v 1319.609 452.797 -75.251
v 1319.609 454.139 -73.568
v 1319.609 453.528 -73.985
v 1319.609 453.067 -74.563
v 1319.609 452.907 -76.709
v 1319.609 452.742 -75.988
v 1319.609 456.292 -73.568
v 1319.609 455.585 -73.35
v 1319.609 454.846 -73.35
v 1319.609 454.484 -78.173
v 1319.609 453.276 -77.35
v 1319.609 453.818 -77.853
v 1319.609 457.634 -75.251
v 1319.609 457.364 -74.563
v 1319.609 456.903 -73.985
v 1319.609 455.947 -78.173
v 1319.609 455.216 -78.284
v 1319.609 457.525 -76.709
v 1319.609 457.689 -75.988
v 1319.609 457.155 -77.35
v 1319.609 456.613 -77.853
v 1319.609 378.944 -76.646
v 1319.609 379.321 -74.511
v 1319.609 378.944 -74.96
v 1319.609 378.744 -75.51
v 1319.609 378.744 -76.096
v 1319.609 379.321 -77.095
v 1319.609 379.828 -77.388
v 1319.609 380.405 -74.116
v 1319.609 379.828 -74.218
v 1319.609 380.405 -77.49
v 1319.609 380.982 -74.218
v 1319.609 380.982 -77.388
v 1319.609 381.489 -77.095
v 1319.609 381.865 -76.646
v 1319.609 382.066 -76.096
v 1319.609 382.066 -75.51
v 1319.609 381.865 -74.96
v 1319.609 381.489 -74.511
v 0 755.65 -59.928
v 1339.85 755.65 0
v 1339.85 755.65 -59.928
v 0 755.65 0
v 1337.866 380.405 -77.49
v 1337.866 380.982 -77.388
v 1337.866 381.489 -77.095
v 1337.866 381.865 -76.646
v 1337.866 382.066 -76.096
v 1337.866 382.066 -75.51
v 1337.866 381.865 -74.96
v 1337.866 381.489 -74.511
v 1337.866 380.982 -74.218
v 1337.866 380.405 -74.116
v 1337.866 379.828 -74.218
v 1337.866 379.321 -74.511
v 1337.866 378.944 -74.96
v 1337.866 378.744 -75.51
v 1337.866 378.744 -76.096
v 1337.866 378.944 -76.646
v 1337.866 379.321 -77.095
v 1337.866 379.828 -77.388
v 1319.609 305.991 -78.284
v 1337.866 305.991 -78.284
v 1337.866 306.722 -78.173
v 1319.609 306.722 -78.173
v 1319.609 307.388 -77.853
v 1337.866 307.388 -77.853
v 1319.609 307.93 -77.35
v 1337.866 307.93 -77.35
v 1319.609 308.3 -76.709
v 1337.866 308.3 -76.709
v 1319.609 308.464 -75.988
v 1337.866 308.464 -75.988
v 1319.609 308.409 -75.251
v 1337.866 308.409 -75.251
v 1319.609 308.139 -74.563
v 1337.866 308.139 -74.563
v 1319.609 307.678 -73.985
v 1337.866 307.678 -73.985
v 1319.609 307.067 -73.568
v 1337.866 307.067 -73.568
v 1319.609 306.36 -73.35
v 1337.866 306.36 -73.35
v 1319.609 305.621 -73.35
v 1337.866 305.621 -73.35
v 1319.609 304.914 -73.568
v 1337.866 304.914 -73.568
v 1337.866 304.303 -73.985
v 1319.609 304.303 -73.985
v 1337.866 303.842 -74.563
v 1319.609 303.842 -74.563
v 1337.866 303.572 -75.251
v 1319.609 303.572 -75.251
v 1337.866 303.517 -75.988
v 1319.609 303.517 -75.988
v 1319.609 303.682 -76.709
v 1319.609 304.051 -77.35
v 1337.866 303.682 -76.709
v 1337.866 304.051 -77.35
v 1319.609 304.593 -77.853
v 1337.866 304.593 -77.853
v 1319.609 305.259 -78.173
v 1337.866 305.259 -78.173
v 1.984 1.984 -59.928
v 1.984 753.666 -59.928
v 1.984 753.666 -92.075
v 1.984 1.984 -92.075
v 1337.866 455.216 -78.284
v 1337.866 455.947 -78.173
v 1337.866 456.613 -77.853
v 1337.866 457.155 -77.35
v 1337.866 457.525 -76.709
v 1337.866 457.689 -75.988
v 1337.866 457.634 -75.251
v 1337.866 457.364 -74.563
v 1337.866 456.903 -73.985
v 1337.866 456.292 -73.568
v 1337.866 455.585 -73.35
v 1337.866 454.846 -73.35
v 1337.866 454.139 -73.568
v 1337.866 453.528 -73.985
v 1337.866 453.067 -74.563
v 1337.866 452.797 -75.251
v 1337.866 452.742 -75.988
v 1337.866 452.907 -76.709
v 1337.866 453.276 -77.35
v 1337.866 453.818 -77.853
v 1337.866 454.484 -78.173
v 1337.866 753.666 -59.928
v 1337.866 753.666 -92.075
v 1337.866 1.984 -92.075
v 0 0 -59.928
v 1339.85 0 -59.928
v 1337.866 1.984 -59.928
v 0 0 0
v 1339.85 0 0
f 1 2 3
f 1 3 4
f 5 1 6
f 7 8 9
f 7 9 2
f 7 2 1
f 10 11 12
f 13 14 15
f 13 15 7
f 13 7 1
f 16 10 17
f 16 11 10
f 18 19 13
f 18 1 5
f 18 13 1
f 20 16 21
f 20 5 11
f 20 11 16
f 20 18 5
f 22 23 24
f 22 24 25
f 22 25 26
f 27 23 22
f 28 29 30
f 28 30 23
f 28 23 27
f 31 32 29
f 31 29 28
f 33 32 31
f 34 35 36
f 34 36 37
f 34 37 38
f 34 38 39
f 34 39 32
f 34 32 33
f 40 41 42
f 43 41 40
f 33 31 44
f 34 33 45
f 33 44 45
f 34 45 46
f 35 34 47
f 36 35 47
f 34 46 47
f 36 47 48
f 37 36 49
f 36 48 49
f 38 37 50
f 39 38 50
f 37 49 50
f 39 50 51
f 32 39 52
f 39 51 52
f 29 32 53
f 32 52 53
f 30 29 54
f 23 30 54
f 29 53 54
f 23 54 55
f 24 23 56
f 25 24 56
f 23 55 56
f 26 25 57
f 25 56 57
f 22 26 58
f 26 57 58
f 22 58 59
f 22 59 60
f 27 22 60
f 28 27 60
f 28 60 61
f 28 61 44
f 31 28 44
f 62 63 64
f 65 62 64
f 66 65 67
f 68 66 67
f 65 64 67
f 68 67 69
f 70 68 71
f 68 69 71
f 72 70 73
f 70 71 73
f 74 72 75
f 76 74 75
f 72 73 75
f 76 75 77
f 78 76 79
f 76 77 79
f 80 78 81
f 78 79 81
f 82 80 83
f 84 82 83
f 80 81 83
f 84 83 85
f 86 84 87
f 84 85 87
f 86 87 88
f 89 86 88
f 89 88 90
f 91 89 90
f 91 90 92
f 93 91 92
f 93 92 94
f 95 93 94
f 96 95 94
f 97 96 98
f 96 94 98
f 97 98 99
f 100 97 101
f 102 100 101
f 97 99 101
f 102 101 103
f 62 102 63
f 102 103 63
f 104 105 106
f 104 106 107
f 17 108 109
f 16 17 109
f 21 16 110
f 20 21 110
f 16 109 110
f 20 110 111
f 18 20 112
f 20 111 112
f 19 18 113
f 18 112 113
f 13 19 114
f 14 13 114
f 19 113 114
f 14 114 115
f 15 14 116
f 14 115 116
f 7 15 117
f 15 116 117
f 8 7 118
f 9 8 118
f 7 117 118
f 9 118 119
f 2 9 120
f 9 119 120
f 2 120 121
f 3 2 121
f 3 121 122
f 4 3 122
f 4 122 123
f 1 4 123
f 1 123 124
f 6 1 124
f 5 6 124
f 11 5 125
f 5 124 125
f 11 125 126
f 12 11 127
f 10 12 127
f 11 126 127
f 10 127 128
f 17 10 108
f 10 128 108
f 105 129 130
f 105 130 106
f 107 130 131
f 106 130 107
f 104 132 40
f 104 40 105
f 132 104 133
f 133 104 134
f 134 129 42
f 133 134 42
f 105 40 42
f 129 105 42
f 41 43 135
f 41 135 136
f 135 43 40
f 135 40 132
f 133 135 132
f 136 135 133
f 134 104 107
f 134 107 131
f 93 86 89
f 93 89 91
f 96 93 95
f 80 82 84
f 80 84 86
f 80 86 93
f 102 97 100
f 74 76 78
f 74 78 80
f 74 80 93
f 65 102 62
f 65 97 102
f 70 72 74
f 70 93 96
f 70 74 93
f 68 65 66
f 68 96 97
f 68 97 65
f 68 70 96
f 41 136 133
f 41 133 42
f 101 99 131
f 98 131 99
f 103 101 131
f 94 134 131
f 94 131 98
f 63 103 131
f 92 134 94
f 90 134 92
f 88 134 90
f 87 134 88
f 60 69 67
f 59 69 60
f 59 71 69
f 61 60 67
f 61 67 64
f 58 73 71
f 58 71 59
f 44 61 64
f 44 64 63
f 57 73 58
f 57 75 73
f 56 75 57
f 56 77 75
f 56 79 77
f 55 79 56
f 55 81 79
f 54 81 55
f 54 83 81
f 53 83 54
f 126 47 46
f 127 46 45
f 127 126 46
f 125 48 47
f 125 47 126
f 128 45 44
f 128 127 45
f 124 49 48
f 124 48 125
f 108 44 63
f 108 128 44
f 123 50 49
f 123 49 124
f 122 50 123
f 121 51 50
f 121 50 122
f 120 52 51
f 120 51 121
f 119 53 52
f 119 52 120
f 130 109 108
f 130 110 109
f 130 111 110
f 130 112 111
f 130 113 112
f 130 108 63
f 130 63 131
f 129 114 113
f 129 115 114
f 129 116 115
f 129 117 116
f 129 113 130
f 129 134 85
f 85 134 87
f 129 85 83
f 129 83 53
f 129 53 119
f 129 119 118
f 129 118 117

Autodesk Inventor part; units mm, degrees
ref_plane "YZ Plane" through (0, 0, 0) normal (1, 0, 0) x (0, 1, 0)
ref_plane "XZ Plane" through (0, 0, 0) normal (0, 1, 0) x (-1, 0, 0)
ref_plane "XY Plane" through (0, 0, 0) normal (0, 0, 1) x (1, 0, 0)
sketch "Sketch1" plane through (0, 0, 0) normal (0, 0, 1) x (1, 0, 0)
  line L0 (0, 0) -> (1339.85, 0)
  line L1 (1339.85, 0) -> (1339.85, 755.65)
  line L2 (1339.85, 755.65) -> (0, 755.65)
  line L3 (0, 755.65) -> (0, 0)
  dimension "tvWidth" = 1339.85
  dimension "tvHeight" = 755.65
  dimension "tvDiagonal" = 1538.2474
extrude "Extrusion1" add sketch "Sketch1" against normal blind 59.9281
sketch "Sketch2" plane through (0, 0, -59.9281) normal (0, 0, -1) x (-1, 0, 0)
  line L0 (-1339.85, 0) -> (-1339.85, 755.65) projected
  line L1 (0, 0) -> (-1339.85, 0) projected
  line L2 (0, 755.65) -> (0, 0) projected
  line L3 (-1339.85, 755.65) -> (0, 755.65) projected
  line L4 (-1337.8656, 753.6656) -> (-1.9844, 753.6656)
  line L5 (-1.9844, 753.6656) -> (-1.9844, 1.9844)
  line L6 (-1.9844, 1.9844) -> (-1337.8656, 1.9844)
  line L7 (-1337.8656, 1.9844) -> (-1337.8656, 753.6656)
  dimension "backBezelToFrontBezelSizeDifference" = 1.9844
  dimension "d7" = 1.9844
  dimension "d8" = 1.9844
  dimension "d9" = 1.9844
extrude "Extrusion2" add sketch "Sketch2" along normal blind 32.1469 contours L4 L5 L6 L7
sketch "Sketch3" plane through (1337.8656, 1.9844, -59.9281) normal (1, 0, 0) x (0, 0, -1)
  line L0 (32.1469, 0) -> (32.1469, 751.6812) projected
  line L1 (0, 751.6812) -> (32.1469, 751.6812) projected
  circle A0 centre (15.875, 453.2312) radius 2.4805
  circle A1 centre (15.875, 304.0062) radius 2.4805
  circle A2 centre (15.875, 378.4203) radius 1.6867
  line L2 (-59.9281, -1.9844) -> (-59.9281, 753.6656) projected
  dimension "largeScrewDistance" = 149.225
  dimension "largeScrewToSmallScrewDistance" = 74.8109
  dimension "screwDistanceFromBack" = 16.2719
  dimension "topLargeScrewDistanceFromTop" = 298.45
  dimension "largeScrewDiameter" = 4.9609
  dimension "smallScrewDiameter" = 3.3734
  dimension "screwDistanceFromFront" = 75.8031
extrude "Extrusion3" cut sketch "Sketch3" against normal blind 18.2563
equation "\"d7\" = backBezelToFrontBezelSizeDifference"
equation "\"d8\" = backBezelToFrontBezelSizeDifference"
equation "\"d9\" = backBezelToFrontBezelSizeDifference"
properties part number "tv"
